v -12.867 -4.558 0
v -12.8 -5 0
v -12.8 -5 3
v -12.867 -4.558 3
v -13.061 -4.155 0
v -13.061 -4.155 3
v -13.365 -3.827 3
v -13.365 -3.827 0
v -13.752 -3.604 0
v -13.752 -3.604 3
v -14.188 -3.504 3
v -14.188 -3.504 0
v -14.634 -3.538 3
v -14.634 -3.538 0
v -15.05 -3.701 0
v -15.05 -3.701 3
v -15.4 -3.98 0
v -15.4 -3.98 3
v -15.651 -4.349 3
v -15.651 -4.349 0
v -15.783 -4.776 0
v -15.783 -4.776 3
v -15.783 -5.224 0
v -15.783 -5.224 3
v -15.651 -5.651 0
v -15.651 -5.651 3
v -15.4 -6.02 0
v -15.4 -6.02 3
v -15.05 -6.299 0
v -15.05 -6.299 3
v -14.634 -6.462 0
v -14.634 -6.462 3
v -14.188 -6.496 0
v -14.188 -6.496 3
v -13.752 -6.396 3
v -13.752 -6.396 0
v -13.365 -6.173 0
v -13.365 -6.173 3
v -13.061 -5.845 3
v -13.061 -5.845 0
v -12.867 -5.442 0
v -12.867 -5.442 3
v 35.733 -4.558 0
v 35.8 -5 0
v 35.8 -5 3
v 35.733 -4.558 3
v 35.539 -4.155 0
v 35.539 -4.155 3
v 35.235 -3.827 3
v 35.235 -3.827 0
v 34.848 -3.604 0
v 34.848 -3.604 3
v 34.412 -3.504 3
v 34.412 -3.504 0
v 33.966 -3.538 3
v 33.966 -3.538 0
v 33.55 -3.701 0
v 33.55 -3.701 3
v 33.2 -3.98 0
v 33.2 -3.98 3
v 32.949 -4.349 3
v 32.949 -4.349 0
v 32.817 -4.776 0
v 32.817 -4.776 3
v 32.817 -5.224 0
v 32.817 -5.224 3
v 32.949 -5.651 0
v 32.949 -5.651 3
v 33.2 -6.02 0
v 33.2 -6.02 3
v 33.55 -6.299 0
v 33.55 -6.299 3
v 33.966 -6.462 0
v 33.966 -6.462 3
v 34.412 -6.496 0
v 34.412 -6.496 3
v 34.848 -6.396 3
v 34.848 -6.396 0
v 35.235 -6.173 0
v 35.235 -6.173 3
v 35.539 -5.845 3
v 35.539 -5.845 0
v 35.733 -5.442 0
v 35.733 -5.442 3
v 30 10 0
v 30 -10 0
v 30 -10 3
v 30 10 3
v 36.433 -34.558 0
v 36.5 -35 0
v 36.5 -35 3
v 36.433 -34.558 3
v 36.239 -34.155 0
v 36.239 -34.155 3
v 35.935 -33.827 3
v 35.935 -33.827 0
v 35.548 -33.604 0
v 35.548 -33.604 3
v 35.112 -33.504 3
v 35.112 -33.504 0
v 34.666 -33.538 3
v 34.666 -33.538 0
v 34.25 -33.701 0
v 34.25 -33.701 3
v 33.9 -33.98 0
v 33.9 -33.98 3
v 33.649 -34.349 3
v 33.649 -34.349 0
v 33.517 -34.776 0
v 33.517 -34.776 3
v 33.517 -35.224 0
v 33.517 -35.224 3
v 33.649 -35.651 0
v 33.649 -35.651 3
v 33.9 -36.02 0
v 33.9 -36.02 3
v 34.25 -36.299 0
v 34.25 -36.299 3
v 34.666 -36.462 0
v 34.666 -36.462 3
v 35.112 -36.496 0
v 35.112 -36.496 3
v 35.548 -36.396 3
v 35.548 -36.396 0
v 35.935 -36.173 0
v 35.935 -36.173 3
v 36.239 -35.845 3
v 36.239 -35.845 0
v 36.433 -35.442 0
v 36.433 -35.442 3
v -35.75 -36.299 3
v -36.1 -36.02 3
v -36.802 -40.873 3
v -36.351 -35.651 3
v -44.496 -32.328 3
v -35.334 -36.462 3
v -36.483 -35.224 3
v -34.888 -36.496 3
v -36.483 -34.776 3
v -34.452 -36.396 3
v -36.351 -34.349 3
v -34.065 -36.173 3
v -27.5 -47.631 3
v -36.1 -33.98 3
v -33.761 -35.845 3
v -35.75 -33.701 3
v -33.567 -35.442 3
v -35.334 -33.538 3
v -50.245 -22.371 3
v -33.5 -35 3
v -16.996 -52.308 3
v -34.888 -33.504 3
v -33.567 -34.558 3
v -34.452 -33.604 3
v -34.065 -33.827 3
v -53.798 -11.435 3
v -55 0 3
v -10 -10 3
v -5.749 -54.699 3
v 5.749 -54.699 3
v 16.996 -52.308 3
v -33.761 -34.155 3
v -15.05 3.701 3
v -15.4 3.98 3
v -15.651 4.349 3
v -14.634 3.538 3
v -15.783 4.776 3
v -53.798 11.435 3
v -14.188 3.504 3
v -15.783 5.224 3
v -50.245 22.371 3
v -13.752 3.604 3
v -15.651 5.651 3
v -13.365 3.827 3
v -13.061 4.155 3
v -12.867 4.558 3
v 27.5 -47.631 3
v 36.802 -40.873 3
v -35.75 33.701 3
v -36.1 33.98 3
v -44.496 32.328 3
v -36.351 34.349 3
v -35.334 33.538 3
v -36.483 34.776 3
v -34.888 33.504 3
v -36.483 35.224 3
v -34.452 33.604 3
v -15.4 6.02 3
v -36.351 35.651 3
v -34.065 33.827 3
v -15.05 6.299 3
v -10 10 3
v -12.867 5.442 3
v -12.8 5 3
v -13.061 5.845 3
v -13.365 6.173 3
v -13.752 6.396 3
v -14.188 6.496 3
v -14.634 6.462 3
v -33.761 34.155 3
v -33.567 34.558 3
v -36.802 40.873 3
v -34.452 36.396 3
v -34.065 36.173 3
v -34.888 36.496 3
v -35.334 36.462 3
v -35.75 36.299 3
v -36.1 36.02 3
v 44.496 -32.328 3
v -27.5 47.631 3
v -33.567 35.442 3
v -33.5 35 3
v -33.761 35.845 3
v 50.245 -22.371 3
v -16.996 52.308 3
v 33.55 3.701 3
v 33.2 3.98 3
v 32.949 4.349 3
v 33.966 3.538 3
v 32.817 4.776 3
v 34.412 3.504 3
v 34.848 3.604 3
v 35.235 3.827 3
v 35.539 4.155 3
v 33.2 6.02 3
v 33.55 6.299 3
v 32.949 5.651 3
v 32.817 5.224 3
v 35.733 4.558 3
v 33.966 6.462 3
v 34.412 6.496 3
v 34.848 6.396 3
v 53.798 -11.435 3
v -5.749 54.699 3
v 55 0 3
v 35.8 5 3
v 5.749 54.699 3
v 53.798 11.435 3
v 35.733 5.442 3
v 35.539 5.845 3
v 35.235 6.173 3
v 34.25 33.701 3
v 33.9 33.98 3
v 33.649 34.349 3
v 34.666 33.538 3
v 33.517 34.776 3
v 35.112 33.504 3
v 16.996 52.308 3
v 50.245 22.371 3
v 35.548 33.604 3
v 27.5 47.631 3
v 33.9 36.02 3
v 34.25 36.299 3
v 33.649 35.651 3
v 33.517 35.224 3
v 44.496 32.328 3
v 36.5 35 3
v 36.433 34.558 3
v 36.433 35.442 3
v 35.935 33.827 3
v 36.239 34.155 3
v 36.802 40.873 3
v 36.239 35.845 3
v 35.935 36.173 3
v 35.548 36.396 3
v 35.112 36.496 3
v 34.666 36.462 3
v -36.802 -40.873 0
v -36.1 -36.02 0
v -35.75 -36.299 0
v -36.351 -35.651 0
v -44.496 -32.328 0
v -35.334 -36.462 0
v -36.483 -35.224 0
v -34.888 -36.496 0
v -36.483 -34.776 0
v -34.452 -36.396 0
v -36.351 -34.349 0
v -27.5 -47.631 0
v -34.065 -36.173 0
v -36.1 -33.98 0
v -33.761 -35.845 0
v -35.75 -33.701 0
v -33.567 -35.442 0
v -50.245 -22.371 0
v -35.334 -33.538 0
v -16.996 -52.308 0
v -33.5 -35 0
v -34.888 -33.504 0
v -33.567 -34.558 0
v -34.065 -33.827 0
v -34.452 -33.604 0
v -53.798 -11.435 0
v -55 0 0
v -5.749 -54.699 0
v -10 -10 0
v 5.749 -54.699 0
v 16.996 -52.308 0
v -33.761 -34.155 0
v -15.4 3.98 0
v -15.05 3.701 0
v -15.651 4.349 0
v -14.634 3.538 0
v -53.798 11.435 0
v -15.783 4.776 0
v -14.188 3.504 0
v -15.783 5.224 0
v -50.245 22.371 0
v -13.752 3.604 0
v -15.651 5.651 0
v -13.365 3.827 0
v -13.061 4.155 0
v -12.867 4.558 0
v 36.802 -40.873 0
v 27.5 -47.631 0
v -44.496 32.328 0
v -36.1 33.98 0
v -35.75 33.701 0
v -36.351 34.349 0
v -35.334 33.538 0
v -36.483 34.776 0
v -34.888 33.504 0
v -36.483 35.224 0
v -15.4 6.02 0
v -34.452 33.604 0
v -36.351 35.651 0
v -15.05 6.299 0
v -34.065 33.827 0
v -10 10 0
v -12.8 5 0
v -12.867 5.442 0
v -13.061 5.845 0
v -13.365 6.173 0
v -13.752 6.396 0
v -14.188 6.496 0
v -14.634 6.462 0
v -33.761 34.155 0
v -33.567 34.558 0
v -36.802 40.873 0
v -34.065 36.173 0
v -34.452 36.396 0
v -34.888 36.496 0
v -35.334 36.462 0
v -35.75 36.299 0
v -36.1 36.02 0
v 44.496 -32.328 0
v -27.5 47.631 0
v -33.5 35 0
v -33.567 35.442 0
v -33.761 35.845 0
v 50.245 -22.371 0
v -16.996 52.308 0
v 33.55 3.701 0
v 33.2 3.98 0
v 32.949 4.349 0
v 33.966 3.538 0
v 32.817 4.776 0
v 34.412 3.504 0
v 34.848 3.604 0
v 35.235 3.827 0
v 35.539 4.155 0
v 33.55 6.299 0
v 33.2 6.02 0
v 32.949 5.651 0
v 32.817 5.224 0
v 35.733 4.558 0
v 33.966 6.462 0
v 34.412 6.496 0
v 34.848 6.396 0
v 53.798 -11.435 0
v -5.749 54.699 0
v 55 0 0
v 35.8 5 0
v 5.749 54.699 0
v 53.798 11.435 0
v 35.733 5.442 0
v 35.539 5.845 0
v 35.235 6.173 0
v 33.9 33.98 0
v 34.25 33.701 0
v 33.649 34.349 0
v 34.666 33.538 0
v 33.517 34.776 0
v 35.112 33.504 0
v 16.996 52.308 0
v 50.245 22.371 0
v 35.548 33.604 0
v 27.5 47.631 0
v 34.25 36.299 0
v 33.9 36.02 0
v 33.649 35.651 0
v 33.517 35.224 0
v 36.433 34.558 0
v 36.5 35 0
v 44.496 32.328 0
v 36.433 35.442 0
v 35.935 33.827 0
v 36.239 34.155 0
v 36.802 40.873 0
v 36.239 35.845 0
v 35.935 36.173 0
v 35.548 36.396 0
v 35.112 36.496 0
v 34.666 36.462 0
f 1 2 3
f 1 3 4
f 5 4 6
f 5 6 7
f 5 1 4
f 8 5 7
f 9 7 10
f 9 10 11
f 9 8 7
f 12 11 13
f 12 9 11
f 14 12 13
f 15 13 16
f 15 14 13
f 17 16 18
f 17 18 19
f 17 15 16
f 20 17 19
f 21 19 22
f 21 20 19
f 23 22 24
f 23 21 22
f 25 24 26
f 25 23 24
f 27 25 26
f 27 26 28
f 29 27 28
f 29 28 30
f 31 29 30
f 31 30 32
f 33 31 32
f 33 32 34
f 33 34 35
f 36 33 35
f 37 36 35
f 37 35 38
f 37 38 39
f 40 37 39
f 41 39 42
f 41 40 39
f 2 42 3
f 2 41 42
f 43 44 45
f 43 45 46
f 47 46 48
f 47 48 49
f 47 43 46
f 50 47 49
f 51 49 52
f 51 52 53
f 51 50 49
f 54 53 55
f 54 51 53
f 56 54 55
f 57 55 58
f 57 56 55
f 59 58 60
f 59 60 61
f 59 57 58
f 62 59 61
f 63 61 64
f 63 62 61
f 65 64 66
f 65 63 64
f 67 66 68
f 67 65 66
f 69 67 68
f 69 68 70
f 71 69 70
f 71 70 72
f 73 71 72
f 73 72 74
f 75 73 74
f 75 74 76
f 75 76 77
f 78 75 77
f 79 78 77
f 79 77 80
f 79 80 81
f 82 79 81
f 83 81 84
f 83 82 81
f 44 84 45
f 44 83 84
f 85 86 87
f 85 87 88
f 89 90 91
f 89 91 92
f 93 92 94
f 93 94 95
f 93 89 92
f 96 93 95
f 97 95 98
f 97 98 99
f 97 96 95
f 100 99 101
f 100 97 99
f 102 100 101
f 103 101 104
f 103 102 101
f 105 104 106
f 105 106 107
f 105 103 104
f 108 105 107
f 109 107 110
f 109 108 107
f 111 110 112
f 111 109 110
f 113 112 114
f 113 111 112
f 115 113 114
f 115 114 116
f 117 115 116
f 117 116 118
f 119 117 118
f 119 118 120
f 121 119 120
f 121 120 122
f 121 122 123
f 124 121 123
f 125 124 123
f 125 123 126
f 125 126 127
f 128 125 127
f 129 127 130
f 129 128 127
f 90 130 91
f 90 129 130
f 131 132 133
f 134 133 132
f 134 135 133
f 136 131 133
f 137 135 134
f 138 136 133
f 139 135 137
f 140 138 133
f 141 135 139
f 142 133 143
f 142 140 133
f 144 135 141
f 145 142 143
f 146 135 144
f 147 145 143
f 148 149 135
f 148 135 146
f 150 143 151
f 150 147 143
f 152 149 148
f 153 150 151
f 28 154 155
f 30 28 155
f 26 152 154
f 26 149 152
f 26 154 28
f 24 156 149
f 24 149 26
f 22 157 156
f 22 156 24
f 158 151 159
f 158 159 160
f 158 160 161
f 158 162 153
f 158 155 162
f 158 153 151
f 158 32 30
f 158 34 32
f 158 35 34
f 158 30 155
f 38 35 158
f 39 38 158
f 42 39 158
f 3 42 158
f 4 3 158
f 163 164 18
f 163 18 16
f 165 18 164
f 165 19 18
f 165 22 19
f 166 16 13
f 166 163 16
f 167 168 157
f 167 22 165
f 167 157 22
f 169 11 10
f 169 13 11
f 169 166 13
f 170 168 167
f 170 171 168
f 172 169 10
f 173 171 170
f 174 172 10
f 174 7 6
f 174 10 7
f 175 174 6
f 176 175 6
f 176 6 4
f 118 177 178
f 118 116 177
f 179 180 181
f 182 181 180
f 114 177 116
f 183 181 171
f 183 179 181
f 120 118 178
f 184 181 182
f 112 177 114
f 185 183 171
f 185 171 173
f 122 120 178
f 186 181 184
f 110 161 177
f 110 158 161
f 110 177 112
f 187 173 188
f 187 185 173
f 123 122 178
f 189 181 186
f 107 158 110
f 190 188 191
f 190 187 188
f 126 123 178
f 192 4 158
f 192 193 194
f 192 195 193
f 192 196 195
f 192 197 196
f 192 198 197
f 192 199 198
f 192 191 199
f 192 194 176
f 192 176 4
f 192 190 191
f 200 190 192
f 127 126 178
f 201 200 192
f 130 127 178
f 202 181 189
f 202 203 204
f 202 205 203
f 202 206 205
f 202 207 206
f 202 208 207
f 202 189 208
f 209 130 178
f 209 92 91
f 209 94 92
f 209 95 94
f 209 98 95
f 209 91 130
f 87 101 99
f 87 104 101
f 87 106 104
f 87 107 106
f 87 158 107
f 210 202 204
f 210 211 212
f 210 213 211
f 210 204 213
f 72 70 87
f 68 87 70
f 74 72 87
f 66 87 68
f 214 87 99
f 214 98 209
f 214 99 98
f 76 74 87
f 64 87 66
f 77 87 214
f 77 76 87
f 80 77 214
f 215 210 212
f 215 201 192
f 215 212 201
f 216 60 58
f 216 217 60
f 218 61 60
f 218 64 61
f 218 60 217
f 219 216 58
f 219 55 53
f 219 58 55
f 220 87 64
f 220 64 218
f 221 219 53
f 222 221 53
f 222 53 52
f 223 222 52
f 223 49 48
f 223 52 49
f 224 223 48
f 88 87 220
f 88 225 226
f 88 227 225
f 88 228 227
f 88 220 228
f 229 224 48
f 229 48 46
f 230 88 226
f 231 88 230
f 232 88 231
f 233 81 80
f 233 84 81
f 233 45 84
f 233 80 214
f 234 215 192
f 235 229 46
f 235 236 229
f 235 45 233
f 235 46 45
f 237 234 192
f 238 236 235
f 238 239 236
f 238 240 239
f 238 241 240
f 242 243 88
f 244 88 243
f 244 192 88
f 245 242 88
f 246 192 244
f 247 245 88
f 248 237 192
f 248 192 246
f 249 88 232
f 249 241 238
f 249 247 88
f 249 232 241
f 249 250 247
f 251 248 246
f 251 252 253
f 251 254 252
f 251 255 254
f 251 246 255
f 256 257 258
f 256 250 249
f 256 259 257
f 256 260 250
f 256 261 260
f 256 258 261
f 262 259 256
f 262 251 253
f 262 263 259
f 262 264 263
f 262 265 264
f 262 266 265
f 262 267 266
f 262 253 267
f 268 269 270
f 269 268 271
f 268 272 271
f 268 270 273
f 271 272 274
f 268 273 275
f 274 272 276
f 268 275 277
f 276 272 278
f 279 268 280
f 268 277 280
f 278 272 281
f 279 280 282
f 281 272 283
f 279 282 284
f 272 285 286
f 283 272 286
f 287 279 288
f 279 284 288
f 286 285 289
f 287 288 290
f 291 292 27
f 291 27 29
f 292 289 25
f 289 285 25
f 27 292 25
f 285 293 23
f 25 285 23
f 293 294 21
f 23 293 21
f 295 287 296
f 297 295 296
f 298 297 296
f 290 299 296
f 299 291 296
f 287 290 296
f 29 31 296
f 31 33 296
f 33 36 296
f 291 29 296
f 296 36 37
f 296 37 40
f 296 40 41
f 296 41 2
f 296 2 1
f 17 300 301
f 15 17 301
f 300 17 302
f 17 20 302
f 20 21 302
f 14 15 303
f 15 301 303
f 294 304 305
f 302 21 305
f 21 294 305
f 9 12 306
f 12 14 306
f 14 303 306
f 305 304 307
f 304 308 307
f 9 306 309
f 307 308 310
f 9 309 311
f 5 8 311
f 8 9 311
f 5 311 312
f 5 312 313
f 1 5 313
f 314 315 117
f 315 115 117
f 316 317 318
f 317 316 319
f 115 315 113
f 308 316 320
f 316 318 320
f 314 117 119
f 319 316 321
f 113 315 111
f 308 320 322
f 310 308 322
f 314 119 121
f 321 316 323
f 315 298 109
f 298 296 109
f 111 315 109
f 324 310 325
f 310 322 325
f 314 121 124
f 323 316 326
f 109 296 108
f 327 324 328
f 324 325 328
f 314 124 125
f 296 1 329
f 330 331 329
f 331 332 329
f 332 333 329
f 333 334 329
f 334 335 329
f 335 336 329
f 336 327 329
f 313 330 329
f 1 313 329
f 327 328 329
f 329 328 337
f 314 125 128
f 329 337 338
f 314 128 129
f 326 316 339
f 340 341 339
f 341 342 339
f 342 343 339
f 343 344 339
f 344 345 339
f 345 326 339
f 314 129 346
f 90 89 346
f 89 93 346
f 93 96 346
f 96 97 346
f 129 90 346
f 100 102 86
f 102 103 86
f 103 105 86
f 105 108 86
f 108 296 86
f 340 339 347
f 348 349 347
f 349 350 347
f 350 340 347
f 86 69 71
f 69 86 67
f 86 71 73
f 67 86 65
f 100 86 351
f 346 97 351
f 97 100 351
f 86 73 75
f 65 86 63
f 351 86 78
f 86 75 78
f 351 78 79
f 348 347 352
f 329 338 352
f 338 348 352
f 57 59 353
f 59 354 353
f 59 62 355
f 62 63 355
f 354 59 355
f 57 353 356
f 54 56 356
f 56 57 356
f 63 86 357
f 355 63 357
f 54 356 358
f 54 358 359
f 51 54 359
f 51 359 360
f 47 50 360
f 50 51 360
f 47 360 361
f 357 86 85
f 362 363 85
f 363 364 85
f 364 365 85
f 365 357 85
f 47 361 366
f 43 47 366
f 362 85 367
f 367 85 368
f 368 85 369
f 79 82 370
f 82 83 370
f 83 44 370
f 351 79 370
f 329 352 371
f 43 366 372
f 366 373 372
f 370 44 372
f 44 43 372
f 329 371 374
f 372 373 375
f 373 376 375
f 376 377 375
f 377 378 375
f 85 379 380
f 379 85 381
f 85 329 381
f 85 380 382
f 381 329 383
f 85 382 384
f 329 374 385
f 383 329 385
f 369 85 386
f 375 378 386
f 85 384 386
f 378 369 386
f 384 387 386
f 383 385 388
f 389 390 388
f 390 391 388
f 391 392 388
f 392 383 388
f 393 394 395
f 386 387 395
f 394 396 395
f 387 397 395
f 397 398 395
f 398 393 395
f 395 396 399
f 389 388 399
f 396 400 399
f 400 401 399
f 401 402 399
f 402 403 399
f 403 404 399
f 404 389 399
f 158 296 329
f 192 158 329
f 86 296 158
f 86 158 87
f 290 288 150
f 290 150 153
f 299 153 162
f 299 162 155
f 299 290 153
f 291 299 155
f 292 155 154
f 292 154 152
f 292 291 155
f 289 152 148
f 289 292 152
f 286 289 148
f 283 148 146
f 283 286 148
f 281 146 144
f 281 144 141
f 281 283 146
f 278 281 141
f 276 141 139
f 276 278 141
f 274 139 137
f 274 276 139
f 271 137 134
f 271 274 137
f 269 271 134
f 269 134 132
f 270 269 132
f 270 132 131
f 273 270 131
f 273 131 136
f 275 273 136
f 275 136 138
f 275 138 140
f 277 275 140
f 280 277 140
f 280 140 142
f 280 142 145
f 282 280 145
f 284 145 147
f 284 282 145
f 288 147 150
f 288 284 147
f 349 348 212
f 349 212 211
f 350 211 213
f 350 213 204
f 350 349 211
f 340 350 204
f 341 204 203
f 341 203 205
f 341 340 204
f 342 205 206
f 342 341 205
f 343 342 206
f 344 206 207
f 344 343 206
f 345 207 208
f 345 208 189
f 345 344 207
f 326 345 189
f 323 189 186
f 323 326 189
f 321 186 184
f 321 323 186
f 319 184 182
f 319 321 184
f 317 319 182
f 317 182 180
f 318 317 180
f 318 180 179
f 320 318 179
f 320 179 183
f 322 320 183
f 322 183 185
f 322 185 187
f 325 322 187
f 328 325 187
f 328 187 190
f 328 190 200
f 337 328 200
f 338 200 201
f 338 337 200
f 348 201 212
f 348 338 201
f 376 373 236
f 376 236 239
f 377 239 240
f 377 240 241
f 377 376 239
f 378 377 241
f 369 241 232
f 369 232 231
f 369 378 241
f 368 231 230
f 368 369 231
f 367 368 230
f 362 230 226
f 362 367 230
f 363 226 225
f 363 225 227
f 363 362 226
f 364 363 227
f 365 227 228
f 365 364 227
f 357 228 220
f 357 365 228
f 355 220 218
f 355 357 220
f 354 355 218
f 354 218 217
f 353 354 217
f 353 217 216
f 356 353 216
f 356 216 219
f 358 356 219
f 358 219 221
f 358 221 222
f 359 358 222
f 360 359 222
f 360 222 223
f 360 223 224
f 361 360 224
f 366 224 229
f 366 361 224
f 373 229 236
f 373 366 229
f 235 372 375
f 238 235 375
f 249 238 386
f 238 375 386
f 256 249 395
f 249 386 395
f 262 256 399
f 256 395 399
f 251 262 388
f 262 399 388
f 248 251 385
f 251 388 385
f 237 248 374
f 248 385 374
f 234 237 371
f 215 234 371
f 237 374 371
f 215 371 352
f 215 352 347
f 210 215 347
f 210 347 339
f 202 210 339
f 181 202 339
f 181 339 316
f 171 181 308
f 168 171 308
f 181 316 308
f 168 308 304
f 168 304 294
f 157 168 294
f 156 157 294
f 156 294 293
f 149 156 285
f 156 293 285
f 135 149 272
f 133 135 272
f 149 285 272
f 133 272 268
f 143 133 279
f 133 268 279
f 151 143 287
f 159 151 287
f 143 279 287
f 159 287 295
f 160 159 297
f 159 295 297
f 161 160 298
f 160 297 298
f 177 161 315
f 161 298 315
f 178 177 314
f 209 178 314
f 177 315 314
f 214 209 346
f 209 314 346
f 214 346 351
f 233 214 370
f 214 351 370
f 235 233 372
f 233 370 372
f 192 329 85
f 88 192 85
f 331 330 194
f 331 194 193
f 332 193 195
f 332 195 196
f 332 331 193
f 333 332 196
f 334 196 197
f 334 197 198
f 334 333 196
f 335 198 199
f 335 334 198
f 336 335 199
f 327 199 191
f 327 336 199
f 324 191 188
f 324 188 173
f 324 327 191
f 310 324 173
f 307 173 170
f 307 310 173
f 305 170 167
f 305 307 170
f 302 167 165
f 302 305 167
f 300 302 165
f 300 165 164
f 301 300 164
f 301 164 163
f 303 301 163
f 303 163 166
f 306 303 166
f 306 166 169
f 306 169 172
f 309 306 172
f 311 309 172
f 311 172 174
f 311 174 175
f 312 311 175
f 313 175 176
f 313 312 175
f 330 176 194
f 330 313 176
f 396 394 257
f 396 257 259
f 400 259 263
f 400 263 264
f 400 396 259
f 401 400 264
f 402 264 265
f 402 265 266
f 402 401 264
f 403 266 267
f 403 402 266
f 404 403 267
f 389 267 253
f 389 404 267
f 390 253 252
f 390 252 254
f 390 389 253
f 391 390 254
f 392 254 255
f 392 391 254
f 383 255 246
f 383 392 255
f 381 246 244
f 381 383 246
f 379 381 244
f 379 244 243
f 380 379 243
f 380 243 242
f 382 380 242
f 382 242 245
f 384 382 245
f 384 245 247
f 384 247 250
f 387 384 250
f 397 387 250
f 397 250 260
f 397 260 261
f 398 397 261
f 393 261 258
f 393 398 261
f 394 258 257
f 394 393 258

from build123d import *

# Parameters (mm, degrees)
SKETCH_1_R      = 55
SKETCH_1_R_2    = 1.5
SKETCH_1_W      = 40
SKETCH_1_H      = 20
EXTRUDE_2_DEPTH = 3


with BuildPart() as part:
    # 草图1 → 凸台-拉伸2 (new body)
    with BuildSketch(Plane.XY):
        Circle(SKETCH_1_R)
        with Locations((-35, 35)):
            Circle(SKETCH_1_R_2, mode=Mode.SUBTRACT)
        with Locations((35, 35)):
            Circle(SKETCH_1_R_2, mode=Mode.SUBTRACT)
        with Locations((35, -35)):
            Circle(SKETCH_1_R_2, mode=Mode.SUBTRACT)
        with Locations((-35, -35)):
            Circle(SKETCH_1_R_2, mode=Mode.SUBTRACT)
        with Locations((-14.3, 5)):
            Circle(SKETCH_1_R_2, mode=Mode.SUBTRACT)
        with Locations((-14.3, -5)):
            Circle(SKETCH_1_R_2, mode=Mode.SUBTRACT)
        with Locations((34.3, 5)):
            Circle(SKETCH_1_R_2, mode=Mode.SUBTRACT)
        with Locations((34.3, -5)):
            Circle(SKETCH_1_R_2, mode=Mode.SUBTRACT)
        with Locations((10, 0)):
            Rectangle(SKETCH_1_W, SKETCH_1_H, mode=Mode.SUBTRACT)
    extrude(amount=EXTRUDE_2_DEPTH)


solid = part.part
